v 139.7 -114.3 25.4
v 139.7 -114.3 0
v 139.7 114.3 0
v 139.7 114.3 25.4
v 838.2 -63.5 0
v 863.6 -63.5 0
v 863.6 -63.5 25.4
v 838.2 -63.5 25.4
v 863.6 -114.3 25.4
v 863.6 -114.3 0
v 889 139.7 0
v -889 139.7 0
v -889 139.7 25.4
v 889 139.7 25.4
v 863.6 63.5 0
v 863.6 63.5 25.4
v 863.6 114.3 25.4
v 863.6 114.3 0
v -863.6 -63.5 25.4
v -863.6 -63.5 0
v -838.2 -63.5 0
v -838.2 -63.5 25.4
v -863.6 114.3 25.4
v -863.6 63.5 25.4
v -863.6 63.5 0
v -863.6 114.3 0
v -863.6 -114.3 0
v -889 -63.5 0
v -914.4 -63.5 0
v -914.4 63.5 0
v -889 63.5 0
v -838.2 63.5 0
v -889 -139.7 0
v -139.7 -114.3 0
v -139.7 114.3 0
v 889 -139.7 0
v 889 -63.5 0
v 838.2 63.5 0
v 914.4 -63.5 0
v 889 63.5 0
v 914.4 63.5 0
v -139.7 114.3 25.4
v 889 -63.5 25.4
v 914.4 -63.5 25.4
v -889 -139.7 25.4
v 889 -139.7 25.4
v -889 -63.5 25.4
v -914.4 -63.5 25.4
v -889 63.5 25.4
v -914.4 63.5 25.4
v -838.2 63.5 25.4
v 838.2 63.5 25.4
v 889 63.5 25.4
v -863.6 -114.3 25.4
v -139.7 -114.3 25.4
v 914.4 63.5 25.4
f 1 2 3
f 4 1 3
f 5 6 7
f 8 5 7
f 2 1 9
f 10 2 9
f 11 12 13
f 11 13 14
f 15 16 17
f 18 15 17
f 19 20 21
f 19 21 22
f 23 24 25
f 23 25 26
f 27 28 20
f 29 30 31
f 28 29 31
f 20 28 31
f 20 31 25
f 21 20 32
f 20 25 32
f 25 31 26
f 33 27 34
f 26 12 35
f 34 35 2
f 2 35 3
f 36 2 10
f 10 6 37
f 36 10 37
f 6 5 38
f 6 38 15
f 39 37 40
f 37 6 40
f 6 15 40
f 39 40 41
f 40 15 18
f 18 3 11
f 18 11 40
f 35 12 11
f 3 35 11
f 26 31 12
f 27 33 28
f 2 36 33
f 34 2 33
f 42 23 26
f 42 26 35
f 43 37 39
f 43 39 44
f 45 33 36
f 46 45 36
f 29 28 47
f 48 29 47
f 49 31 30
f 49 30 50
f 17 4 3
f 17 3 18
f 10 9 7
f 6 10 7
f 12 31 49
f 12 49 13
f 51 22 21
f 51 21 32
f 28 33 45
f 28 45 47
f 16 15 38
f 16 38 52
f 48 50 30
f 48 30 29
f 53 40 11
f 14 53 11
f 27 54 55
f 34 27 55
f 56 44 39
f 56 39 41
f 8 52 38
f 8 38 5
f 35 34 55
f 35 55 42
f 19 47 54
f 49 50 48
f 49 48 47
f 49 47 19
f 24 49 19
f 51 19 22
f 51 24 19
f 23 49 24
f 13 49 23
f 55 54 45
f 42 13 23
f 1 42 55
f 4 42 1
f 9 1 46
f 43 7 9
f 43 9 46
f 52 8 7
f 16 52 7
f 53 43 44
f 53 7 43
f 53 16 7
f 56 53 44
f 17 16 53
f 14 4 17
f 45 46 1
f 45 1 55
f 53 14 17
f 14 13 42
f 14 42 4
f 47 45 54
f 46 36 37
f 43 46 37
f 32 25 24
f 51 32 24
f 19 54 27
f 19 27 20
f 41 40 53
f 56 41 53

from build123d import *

# Parameters (mm, degrees)
F0_W      = 1778
F0_H      = 279.4
F1_DEPTH  = 25.4
F2_W      = 1727.2
F2_H      = 228.6
F3_DEPTH  = 25.401
F4_W      = 279.4
F4_H      = 279.4
F5_DEPTH  = 25.4
F6_W      = 127
F6_H      = 25.4
F7_DEPTH  = 25.4
F8_W      = 127
F8_H      = 25.4
F9_DEPTH  = 25.4
F10_W     = 127
F10_H     = 25.4
F11_DEPTH = 25.4
F12_W     = 127
F12_H     = 25.4
F13_DEPTH = 25.4


with BuildPart() as f1:
    # F0 (on Top) → F1 (new body)
    with BuildSketch(Plane.XY):
        Rectangle(F0_W, F0_H)
    extrude(amount=F1_DEPTH)

    # F2 (on face) → F3 (cut, through all)
    with BuildSketch(Plane.XY.offset(25.4)):
        Rectangle(F2_W, F2_H)
    extrude(amount=-F3_DEPTH, mode=Mode.SUBTRACT)

    # F4 (on Top) → F5 (join)
    with BuildSketch(Plane.XY):
        Rectangle(F4_W, F4_H)
    extrude(amount=F5_DEPTH)

    # F6 (on face) → F7 (join)
    with BuildSketch(Plane(origin=(-889, 0, 0), x_dir=(0, -1, 0), z_dir=(-1, 0, 0))):
        with Locations((0, 12.7)):
            Rectangle(F6_W, F6_H)
    extrude(amount=F7_DEPTH)

    # F8 (on face) → F9 (join)
    with BuildSketch(Plane(origin=(863.6, 0, 0), x_dir=(0, -1, 0), z_dir=(-1, 0, 0))):
        with Locations((0, 12.7)):
            Rectangle(F8_W, F8_H)
    extrude(amount=F9_DEPTH)

    # F10 (on face) → F11 (join)
    with BuildSketch(Plane.YZ.offset(889)):
        with Locations((0, 12.7)):
            Rectangle(F10_W, F10_H)
    extrude(amount=F11_DEPTH)

    # F12 (on face) → F13 (join)
    with BuildSketch(Plane.YZ.offset(-863.6)):
        with Locations((0, 12.7)):
            Rectangle(F12_W, F12_H)
    extrude(amount=F13_DEPTH)


solid = f1.part
